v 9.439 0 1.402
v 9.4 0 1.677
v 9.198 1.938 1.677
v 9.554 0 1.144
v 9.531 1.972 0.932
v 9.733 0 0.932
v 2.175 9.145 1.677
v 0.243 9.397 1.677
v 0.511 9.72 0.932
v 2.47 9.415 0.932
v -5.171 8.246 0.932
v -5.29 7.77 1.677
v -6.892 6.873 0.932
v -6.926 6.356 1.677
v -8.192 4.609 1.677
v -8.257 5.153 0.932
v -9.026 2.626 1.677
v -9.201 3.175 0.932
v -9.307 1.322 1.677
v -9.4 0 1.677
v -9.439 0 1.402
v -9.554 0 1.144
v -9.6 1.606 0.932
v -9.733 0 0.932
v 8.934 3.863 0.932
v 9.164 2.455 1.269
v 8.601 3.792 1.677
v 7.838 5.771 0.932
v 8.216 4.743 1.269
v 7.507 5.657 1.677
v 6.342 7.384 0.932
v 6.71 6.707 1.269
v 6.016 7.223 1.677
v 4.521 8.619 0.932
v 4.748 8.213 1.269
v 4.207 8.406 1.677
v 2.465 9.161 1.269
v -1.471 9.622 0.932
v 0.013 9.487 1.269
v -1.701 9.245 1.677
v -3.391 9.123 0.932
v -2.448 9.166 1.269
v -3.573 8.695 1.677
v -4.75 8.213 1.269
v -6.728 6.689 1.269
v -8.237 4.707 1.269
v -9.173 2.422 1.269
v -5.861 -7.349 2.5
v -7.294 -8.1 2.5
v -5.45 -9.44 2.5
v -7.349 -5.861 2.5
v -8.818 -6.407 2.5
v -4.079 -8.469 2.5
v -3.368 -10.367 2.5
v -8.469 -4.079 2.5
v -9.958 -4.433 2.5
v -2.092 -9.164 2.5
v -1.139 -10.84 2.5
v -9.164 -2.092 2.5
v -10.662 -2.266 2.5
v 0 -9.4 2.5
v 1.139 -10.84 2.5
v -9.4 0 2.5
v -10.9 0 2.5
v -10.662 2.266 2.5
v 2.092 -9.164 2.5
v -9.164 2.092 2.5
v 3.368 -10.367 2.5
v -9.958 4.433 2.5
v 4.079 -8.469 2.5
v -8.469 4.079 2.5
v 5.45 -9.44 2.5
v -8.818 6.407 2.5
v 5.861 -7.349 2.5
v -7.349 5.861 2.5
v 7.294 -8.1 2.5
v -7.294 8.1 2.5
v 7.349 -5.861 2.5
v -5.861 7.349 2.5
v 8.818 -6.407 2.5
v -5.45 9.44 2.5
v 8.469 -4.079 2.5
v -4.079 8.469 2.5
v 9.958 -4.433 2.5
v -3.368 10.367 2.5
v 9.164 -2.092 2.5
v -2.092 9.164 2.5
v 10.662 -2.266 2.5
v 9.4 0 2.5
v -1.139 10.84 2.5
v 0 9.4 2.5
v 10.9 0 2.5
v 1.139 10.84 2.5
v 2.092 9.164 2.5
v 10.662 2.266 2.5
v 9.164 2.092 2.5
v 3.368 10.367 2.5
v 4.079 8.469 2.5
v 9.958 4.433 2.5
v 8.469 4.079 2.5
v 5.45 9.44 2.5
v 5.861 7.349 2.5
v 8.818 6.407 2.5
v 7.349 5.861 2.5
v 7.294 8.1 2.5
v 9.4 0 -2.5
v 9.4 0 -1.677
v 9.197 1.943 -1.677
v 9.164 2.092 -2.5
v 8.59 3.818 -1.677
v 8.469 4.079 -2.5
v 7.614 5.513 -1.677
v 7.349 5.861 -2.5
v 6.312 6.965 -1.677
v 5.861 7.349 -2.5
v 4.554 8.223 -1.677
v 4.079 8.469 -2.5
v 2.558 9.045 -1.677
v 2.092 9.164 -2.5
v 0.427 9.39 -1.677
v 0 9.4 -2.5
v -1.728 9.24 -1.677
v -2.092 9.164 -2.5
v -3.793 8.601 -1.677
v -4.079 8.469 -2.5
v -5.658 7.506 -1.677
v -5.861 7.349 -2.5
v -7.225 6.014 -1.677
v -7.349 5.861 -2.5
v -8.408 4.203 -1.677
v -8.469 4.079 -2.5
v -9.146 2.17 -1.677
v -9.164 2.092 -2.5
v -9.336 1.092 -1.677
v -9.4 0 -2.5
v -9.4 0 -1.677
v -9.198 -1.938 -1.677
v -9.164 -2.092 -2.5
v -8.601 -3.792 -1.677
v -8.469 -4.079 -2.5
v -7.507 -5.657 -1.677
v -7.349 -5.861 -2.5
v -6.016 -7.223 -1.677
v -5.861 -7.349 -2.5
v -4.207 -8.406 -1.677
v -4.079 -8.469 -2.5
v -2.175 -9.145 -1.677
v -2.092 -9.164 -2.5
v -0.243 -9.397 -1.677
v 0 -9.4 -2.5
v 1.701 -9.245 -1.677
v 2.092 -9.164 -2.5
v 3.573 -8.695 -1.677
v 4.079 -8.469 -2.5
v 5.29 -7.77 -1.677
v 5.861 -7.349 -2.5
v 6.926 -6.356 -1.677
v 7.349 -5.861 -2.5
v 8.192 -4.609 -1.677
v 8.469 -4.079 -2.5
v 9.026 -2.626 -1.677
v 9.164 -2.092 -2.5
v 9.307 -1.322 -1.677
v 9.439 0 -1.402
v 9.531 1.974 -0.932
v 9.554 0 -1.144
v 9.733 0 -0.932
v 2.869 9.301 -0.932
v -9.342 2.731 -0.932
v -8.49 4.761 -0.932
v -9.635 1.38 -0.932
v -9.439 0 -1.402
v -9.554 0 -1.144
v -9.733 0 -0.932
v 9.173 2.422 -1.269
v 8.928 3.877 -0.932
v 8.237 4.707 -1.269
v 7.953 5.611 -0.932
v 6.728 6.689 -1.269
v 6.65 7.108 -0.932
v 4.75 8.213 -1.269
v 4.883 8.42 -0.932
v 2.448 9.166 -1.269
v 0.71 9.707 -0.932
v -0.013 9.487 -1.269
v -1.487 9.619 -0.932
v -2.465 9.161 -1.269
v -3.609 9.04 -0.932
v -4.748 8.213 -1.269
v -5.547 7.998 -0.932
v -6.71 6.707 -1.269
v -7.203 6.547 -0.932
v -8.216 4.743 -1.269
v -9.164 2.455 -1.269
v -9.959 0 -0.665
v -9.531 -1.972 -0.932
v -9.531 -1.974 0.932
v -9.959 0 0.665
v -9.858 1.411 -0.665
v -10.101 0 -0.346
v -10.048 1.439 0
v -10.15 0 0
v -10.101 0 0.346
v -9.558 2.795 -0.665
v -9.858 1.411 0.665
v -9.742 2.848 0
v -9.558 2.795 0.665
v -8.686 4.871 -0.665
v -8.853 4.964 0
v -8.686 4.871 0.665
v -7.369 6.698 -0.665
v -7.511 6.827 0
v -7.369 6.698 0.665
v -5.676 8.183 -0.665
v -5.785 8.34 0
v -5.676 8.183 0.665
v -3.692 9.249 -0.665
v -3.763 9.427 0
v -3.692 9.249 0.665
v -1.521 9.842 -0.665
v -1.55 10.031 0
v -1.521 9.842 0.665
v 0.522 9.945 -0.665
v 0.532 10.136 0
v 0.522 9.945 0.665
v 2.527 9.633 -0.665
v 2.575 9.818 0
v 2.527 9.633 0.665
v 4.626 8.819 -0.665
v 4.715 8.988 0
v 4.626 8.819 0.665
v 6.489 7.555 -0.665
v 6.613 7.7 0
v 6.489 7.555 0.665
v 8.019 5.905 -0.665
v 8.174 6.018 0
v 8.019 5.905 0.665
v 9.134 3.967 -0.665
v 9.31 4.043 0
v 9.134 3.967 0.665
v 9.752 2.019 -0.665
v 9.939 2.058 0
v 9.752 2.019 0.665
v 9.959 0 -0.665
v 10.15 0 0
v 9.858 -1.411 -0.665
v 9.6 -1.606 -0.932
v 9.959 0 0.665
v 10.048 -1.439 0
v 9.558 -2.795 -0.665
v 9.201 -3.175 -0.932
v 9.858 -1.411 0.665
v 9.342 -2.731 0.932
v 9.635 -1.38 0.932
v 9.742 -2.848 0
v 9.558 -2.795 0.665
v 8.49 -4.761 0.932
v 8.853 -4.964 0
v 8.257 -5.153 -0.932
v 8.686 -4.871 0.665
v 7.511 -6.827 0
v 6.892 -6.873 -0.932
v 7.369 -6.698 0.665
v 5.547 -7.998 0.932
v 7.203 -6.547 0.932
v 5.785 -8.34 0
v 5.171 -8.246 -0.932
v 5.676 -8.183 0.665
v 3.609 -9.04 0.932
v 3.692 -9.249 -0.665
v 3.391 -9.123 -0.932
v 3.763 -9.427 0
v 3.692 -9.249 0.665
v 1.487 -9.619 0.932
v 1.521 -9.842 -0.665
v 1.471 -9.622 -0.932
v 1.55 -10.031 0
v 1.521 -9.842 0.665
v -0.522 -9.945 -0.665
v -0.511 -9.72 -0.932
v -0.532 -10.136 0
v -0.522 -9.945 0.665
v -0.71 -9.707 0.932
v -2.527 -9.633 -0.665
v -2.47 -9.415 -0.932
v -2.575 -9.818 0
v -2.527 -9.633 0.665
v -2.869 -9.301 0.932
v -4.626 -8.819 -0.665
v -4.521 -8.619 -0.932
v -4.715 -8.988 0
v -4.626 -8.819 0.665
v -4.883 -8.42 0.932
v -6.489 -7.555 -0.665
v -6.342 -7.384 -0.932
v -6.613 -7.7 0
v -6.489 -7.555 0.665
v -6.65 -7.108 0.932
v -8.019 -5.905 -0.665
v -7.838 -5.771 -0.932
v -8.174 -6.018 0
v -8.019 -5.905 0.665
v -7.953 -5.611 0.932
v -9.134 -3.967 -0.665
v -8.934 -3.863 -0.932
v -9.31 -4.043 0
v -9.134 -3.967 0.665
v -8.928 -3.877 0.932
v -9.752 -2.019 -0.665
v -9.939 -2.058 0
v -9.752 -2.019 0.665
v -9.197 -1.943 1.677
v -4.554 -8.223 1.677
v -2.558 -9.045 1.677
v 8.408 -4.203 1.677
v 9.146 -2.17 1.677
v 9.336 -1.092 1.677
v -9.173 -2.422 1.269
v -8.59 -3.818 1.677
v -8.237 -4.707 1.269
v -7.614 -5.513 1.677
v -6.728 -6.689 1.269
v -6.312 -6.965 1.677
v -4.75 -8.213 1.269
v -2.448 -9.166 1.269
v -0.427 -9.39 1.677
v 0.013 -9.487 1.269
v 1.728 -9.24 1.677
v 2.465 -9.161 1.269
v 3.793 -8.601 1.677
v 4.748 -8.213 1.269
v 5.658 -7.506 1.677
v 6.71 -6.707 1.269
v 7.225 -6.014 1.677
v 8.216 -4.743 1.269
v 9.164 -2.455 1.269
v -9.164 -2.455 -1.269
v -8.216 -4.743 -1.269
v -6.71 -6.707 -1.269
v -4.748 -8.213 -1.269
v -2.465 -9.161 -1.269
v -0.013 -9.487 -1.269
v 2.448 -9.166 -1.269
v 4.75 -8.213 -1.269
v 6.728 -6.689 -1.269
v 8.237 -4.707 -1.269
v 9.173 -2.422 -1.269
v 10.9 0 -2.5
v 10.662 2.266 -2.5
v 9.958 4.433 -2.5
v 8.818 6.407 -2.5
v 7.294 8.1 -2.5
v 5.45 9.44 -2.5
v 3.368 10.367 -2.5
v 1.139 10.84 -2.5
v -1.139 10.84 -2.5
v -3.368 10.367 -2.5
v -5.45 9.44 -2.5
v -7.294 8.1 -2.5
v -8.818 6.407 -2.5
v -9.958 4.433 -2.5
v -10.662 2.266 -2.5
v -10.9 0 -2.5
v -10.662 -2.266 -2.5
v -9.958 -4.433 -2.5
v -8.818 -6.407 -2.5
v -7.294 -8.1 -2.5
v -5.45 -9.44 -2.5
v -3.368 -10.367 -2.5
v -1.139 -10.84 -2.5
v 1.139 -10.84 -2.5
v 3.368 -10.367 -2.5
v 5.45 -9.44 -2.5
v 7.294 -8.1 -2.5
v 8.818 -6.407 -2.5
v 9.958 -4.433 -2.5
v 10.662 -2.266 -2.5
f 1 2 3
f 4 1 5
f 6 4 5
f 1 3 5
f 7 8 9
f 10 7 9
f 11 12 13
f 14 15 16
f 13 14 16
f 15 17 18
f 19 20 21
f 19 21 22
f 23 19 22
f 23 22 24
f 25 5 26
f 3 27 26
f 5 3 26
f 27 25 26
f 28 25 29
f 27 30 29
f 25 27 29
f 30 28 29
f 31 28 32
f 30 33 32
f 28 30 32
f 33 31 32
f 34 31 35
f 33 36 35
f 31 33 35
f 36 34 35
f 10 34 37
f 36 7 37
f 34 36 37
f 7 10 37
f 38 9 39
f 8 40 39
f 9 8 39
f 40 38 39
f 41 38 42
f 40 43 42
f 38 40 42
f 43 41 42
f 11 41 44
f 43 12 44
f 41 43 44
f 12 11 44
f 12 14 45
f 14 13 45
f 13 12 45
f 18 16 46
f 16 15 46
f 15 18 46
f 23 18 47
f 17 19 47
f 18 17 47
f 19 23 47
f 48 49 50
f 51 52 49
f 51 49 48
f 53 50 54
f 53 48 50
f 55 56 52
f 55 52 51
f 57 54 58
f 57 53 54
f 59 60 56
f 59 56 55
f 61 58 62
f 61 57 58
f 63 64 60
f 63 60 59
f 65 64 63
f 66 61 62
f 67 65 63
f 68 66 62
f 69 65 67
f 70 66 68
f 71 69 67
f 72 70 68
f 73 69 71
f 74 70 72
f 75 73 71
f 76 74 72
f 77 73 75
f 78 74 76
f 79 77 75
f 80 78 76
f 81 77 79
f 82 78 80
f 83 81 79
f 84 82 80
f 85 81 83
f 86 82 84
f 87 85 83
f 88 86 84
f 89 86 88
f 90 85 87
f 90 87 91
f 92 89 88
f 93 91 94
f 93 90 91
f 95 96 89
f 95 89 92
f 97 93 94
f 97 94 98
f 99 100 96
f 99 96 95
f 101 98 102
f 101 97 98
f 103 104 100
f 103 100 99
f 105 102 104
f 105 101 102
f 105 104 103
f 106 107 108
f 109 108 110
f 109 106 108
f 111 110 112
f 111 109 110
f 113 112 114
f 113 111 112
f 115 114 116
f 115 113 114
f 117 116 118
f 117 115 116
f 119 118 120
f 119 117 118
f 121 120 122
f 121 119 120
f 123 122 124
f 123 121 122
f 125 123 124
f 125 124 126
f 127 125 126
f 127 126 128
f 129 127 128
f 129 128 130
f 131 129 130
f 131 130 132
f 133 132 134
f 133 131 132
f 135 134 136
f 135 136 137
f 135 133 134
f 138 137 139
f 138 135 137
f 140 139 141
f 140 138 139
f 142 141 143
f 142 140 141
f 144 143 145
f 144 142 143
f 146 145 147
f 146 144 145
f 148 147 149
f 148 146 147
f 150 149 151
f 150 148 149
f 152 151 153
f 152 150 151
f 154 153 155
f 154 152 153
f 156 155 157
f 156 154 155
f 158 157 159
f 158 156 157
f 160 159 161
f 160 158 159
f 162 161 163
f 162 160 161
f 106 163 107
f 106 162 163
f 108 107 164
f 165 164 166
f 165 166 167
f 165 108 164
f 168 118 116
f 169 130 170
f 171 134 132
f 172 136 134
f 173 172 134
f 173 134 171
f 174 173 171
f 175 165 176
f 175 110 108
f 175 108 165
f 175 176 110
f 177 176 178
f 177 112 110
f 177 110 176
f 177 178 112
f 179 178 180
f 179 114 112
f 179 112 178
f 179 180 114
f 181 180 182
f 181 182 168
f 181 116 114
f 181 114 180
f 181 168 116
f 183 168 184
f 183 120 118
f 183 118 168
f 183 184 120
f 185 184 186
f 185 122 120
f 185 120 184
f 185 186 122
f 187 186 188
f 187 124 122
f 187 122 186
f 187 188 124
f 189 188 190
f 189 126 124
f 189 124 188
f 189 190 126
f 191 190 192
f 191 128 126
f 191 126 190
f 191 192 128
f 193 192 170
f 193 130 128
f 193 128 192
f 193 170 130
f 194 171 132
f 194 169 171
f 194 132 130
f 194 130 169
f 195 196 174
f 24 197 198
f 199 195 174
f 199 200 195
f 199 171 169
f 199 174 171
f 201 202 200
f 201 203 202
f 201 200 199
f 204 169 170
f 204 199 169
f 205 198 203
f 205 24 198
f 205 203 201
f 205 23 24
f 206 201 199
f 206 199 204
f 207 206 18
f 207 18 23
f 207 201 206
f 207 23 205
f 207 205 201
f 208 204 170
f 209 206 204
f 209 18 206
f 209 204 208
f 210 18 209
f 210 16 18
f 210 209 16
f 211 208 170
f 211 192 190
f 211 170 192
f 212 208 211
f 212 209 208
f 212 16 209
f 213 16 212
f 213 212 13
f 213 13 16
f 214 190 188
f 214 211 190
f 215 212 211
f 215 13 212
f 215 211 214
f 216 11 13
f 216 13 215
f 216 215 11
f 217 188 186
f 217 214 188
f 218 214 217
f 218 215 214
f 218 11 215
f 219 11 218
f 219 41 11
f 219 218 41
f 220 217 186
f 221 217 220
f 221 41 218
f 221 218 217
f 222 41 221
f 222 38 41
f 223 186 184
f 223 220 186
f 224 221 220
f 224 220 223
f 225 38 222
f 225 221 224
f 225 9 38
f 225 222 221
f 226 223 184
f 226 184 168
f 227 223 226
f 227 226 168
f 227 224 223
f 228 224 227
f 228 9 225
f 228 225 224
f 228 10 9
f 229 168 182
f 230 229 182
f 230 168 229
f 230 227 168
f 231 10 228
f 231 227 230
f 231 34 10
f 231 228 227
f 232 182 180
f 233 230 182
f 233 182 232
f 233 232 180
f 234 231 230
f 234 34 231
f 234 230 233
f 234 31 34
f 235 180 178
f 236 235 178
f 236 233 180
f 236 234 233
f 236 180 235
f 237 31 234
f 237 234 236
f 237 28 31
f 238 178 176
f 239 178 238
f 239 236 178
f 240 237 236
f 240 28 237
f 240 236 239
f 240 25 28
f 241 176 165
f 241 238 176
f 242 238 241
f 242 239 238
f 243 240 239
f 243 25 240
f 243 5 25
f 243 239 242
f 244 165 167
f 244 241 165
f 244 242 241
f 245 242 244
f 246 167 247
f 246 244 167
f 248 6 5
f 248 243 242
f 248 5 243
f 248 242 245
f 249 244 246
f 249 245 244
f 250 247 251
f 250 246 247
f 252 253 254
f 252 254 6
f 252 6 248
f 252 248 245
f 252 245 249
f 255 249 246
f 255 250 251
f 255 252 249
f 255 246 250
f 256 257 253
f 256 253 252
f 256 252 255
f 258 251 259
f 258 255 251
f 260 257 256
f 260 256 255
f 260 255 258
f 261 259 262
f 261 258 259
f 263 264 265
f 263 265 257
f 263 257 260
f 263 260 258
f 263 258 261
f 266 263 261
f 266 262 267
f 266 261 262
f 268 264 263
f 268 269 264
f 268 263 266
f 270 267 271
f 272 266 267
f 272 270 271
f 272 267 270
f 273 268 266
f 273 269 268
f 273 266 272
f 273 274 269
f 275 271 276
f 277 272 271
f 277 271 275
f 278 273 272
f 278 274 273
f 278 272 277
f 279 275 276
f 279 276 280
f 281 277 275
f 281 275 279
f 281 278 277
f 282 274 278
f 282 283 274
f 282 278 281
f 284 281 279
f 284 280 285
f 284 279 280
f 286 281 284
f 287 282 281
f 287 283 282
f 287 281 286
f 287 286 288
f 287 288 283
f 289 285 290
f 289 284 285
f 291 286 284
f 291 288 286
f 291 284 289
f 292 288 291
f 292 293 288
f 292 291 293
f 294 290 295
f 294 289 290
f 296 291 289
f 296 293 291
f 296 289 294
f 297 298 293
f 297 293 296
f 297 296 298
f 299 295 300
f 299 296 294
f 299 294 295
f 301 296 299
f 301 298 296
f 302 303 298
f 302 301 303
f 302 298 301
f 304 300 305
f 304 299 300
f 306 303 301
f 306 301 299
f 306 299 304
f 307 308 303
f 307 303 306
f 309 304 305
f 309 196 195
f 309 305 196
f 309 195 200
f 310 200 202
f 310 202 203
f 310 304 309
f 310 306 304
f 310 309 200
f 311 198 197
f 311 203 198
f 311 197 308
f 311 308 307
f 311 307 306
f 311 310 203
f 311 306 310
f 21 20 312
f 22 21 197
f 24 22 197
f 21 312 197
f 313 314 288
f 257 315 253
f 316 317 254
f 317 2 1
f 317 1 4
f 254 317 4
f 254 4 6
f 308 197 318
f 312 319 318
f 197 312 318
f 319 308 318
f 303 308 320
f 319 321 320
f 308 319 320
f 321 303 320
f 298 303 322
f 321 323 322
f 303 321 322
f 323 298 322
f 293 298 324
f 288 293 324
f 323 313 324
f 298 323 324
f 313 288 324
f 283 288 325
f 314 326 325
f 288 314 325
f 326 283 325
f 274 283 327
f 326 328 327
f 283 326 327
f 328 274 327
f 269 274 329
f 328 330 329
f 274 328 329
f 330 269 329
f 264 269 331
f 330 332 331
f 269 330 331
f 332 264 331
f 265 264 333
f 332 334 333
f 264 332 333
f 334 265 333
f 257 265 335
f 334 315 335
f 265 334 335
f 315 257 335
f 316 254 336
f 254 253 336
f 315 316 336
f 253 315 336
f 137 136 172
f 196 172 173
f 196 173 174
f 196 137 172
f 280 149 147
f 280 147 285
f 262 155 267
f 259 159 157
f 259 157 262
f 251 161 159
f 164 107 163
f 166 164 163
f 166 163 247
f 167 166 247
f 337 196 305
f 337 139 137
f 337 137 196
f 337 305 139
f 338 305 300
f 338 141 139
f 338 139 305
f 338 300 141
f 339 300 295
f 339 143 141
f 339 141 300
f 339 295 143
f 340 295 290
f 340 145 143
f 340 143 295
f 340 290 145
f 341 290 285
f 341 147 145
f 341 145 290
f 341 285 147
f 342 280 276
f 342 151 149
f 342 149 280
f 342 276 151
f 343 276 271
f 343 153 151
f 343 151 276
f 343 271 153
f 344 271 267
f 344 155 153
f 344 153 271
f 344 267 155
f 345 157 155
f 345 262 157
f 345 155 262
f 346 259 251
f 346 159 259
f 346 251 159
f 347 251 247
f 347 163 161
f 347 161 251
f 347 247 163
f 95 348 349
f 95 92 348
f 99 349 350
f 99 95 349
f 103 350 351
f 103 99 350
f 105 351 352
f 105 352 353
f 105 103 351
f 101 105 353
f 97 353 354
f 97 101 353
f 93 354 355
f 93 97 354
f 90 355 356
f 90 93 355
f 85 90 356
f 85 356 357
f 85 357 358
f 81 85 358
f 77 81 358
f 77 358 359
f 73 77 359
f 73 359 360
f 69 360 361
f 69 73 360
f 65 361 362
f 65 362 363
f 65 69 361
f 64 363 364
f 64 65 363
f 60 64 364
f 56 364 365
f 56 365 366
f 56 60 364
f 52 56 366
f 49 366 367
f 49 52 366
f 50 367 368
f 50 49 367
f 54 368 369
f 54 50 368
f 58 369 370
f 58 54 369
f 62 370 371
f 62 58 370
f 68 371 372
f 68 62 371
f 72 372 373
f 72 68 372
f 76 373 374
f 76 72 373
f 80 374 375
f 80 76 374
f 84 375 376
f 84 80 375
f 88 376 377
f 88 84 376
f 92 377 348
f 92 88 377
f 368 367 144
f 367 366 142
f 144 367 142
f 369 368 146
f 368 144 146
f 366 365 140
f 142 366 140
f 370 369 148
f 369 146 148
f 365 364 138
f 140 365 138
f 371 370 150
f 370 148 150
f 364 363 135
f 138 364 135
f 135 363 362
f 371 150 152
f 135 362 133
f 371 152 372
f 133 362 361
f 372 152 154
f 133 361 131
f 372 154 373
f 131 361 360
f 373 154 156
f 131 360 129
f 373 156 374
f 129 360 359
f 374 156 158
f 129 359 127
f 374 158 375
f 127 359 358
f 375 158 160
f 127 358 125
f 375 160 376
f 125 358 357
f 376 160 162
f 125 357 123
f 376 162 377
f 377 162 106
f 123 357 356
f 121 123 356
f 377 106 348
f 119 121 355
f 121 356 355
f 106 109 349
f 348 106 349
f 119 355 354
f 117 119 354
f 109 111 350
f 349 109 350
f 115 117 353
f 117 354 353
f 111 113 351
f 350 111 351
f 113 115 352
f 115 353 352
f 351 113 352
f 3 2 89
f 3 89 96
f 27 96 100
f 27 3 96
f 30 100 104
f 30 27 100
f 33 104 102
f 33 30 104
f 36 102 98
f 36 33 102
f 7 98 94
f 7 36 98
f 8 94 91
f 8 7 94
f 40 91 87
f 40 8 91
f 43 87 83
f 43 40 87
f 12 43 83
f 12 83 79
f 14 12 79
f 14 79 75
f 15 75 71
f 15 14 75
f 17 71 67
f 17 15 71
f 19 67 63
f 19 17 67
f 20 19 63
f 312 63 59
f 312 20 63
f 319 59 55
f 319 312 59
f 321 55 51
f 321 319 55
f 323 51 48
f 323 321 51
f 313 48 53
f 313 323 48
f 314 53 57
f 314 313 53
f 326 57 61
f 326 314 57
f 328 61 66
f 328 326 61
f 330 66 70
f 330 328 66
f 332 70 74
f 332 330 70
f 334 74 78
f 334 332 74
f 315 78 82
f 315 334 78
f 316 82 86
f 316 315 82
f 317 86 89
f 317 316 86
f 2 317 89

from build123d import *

# Parameters (mm, degrees)
SKETCH_1_R      = 10.9
SKETCH_1_R_2    = 9.4
EXTRUDE_1_DEPTH = 2.5
SKETCH_3_R      = 1.25
FILLET_1_R      = 1


with BuildPart() as part:
    # 草图1 → 凸台-拉伸1 (new body, symmetric)
    with BuildSketch(Plane.XY):
        Circle(SKETCH_1_R)
        Circle(SKETCH_1_R_2, mode=Mode.SUBTRACT)
    extrude(amount=EXTRUDE_1_DEPTH, both=True)

    # 草图3 → 切除-旋转1 (revolve, cut)
    with BuildSketch(Plane(origin=(0, 0, 0), x_dir=(1, 0, 0), z_dir=(0, 1, 0))):
        with Locations((-8.9, 0)):
            Circle(SKETCH_3_R)
    revolve(axis=Axis((0, 0, 2.5), (0, 0, -1)), mode=Mode.SUBTRACT)

    # 圆角1
    fillet_1_edges = [part.edges().sort_by_distance(p)[0] for p in [
        (0, 9.4, 1.145643924),
        (0, -9.4, -1.145643924),
    ]]
    fillet(fillet_1_edges, radius=FILLET_1_R)


solid = part.part
